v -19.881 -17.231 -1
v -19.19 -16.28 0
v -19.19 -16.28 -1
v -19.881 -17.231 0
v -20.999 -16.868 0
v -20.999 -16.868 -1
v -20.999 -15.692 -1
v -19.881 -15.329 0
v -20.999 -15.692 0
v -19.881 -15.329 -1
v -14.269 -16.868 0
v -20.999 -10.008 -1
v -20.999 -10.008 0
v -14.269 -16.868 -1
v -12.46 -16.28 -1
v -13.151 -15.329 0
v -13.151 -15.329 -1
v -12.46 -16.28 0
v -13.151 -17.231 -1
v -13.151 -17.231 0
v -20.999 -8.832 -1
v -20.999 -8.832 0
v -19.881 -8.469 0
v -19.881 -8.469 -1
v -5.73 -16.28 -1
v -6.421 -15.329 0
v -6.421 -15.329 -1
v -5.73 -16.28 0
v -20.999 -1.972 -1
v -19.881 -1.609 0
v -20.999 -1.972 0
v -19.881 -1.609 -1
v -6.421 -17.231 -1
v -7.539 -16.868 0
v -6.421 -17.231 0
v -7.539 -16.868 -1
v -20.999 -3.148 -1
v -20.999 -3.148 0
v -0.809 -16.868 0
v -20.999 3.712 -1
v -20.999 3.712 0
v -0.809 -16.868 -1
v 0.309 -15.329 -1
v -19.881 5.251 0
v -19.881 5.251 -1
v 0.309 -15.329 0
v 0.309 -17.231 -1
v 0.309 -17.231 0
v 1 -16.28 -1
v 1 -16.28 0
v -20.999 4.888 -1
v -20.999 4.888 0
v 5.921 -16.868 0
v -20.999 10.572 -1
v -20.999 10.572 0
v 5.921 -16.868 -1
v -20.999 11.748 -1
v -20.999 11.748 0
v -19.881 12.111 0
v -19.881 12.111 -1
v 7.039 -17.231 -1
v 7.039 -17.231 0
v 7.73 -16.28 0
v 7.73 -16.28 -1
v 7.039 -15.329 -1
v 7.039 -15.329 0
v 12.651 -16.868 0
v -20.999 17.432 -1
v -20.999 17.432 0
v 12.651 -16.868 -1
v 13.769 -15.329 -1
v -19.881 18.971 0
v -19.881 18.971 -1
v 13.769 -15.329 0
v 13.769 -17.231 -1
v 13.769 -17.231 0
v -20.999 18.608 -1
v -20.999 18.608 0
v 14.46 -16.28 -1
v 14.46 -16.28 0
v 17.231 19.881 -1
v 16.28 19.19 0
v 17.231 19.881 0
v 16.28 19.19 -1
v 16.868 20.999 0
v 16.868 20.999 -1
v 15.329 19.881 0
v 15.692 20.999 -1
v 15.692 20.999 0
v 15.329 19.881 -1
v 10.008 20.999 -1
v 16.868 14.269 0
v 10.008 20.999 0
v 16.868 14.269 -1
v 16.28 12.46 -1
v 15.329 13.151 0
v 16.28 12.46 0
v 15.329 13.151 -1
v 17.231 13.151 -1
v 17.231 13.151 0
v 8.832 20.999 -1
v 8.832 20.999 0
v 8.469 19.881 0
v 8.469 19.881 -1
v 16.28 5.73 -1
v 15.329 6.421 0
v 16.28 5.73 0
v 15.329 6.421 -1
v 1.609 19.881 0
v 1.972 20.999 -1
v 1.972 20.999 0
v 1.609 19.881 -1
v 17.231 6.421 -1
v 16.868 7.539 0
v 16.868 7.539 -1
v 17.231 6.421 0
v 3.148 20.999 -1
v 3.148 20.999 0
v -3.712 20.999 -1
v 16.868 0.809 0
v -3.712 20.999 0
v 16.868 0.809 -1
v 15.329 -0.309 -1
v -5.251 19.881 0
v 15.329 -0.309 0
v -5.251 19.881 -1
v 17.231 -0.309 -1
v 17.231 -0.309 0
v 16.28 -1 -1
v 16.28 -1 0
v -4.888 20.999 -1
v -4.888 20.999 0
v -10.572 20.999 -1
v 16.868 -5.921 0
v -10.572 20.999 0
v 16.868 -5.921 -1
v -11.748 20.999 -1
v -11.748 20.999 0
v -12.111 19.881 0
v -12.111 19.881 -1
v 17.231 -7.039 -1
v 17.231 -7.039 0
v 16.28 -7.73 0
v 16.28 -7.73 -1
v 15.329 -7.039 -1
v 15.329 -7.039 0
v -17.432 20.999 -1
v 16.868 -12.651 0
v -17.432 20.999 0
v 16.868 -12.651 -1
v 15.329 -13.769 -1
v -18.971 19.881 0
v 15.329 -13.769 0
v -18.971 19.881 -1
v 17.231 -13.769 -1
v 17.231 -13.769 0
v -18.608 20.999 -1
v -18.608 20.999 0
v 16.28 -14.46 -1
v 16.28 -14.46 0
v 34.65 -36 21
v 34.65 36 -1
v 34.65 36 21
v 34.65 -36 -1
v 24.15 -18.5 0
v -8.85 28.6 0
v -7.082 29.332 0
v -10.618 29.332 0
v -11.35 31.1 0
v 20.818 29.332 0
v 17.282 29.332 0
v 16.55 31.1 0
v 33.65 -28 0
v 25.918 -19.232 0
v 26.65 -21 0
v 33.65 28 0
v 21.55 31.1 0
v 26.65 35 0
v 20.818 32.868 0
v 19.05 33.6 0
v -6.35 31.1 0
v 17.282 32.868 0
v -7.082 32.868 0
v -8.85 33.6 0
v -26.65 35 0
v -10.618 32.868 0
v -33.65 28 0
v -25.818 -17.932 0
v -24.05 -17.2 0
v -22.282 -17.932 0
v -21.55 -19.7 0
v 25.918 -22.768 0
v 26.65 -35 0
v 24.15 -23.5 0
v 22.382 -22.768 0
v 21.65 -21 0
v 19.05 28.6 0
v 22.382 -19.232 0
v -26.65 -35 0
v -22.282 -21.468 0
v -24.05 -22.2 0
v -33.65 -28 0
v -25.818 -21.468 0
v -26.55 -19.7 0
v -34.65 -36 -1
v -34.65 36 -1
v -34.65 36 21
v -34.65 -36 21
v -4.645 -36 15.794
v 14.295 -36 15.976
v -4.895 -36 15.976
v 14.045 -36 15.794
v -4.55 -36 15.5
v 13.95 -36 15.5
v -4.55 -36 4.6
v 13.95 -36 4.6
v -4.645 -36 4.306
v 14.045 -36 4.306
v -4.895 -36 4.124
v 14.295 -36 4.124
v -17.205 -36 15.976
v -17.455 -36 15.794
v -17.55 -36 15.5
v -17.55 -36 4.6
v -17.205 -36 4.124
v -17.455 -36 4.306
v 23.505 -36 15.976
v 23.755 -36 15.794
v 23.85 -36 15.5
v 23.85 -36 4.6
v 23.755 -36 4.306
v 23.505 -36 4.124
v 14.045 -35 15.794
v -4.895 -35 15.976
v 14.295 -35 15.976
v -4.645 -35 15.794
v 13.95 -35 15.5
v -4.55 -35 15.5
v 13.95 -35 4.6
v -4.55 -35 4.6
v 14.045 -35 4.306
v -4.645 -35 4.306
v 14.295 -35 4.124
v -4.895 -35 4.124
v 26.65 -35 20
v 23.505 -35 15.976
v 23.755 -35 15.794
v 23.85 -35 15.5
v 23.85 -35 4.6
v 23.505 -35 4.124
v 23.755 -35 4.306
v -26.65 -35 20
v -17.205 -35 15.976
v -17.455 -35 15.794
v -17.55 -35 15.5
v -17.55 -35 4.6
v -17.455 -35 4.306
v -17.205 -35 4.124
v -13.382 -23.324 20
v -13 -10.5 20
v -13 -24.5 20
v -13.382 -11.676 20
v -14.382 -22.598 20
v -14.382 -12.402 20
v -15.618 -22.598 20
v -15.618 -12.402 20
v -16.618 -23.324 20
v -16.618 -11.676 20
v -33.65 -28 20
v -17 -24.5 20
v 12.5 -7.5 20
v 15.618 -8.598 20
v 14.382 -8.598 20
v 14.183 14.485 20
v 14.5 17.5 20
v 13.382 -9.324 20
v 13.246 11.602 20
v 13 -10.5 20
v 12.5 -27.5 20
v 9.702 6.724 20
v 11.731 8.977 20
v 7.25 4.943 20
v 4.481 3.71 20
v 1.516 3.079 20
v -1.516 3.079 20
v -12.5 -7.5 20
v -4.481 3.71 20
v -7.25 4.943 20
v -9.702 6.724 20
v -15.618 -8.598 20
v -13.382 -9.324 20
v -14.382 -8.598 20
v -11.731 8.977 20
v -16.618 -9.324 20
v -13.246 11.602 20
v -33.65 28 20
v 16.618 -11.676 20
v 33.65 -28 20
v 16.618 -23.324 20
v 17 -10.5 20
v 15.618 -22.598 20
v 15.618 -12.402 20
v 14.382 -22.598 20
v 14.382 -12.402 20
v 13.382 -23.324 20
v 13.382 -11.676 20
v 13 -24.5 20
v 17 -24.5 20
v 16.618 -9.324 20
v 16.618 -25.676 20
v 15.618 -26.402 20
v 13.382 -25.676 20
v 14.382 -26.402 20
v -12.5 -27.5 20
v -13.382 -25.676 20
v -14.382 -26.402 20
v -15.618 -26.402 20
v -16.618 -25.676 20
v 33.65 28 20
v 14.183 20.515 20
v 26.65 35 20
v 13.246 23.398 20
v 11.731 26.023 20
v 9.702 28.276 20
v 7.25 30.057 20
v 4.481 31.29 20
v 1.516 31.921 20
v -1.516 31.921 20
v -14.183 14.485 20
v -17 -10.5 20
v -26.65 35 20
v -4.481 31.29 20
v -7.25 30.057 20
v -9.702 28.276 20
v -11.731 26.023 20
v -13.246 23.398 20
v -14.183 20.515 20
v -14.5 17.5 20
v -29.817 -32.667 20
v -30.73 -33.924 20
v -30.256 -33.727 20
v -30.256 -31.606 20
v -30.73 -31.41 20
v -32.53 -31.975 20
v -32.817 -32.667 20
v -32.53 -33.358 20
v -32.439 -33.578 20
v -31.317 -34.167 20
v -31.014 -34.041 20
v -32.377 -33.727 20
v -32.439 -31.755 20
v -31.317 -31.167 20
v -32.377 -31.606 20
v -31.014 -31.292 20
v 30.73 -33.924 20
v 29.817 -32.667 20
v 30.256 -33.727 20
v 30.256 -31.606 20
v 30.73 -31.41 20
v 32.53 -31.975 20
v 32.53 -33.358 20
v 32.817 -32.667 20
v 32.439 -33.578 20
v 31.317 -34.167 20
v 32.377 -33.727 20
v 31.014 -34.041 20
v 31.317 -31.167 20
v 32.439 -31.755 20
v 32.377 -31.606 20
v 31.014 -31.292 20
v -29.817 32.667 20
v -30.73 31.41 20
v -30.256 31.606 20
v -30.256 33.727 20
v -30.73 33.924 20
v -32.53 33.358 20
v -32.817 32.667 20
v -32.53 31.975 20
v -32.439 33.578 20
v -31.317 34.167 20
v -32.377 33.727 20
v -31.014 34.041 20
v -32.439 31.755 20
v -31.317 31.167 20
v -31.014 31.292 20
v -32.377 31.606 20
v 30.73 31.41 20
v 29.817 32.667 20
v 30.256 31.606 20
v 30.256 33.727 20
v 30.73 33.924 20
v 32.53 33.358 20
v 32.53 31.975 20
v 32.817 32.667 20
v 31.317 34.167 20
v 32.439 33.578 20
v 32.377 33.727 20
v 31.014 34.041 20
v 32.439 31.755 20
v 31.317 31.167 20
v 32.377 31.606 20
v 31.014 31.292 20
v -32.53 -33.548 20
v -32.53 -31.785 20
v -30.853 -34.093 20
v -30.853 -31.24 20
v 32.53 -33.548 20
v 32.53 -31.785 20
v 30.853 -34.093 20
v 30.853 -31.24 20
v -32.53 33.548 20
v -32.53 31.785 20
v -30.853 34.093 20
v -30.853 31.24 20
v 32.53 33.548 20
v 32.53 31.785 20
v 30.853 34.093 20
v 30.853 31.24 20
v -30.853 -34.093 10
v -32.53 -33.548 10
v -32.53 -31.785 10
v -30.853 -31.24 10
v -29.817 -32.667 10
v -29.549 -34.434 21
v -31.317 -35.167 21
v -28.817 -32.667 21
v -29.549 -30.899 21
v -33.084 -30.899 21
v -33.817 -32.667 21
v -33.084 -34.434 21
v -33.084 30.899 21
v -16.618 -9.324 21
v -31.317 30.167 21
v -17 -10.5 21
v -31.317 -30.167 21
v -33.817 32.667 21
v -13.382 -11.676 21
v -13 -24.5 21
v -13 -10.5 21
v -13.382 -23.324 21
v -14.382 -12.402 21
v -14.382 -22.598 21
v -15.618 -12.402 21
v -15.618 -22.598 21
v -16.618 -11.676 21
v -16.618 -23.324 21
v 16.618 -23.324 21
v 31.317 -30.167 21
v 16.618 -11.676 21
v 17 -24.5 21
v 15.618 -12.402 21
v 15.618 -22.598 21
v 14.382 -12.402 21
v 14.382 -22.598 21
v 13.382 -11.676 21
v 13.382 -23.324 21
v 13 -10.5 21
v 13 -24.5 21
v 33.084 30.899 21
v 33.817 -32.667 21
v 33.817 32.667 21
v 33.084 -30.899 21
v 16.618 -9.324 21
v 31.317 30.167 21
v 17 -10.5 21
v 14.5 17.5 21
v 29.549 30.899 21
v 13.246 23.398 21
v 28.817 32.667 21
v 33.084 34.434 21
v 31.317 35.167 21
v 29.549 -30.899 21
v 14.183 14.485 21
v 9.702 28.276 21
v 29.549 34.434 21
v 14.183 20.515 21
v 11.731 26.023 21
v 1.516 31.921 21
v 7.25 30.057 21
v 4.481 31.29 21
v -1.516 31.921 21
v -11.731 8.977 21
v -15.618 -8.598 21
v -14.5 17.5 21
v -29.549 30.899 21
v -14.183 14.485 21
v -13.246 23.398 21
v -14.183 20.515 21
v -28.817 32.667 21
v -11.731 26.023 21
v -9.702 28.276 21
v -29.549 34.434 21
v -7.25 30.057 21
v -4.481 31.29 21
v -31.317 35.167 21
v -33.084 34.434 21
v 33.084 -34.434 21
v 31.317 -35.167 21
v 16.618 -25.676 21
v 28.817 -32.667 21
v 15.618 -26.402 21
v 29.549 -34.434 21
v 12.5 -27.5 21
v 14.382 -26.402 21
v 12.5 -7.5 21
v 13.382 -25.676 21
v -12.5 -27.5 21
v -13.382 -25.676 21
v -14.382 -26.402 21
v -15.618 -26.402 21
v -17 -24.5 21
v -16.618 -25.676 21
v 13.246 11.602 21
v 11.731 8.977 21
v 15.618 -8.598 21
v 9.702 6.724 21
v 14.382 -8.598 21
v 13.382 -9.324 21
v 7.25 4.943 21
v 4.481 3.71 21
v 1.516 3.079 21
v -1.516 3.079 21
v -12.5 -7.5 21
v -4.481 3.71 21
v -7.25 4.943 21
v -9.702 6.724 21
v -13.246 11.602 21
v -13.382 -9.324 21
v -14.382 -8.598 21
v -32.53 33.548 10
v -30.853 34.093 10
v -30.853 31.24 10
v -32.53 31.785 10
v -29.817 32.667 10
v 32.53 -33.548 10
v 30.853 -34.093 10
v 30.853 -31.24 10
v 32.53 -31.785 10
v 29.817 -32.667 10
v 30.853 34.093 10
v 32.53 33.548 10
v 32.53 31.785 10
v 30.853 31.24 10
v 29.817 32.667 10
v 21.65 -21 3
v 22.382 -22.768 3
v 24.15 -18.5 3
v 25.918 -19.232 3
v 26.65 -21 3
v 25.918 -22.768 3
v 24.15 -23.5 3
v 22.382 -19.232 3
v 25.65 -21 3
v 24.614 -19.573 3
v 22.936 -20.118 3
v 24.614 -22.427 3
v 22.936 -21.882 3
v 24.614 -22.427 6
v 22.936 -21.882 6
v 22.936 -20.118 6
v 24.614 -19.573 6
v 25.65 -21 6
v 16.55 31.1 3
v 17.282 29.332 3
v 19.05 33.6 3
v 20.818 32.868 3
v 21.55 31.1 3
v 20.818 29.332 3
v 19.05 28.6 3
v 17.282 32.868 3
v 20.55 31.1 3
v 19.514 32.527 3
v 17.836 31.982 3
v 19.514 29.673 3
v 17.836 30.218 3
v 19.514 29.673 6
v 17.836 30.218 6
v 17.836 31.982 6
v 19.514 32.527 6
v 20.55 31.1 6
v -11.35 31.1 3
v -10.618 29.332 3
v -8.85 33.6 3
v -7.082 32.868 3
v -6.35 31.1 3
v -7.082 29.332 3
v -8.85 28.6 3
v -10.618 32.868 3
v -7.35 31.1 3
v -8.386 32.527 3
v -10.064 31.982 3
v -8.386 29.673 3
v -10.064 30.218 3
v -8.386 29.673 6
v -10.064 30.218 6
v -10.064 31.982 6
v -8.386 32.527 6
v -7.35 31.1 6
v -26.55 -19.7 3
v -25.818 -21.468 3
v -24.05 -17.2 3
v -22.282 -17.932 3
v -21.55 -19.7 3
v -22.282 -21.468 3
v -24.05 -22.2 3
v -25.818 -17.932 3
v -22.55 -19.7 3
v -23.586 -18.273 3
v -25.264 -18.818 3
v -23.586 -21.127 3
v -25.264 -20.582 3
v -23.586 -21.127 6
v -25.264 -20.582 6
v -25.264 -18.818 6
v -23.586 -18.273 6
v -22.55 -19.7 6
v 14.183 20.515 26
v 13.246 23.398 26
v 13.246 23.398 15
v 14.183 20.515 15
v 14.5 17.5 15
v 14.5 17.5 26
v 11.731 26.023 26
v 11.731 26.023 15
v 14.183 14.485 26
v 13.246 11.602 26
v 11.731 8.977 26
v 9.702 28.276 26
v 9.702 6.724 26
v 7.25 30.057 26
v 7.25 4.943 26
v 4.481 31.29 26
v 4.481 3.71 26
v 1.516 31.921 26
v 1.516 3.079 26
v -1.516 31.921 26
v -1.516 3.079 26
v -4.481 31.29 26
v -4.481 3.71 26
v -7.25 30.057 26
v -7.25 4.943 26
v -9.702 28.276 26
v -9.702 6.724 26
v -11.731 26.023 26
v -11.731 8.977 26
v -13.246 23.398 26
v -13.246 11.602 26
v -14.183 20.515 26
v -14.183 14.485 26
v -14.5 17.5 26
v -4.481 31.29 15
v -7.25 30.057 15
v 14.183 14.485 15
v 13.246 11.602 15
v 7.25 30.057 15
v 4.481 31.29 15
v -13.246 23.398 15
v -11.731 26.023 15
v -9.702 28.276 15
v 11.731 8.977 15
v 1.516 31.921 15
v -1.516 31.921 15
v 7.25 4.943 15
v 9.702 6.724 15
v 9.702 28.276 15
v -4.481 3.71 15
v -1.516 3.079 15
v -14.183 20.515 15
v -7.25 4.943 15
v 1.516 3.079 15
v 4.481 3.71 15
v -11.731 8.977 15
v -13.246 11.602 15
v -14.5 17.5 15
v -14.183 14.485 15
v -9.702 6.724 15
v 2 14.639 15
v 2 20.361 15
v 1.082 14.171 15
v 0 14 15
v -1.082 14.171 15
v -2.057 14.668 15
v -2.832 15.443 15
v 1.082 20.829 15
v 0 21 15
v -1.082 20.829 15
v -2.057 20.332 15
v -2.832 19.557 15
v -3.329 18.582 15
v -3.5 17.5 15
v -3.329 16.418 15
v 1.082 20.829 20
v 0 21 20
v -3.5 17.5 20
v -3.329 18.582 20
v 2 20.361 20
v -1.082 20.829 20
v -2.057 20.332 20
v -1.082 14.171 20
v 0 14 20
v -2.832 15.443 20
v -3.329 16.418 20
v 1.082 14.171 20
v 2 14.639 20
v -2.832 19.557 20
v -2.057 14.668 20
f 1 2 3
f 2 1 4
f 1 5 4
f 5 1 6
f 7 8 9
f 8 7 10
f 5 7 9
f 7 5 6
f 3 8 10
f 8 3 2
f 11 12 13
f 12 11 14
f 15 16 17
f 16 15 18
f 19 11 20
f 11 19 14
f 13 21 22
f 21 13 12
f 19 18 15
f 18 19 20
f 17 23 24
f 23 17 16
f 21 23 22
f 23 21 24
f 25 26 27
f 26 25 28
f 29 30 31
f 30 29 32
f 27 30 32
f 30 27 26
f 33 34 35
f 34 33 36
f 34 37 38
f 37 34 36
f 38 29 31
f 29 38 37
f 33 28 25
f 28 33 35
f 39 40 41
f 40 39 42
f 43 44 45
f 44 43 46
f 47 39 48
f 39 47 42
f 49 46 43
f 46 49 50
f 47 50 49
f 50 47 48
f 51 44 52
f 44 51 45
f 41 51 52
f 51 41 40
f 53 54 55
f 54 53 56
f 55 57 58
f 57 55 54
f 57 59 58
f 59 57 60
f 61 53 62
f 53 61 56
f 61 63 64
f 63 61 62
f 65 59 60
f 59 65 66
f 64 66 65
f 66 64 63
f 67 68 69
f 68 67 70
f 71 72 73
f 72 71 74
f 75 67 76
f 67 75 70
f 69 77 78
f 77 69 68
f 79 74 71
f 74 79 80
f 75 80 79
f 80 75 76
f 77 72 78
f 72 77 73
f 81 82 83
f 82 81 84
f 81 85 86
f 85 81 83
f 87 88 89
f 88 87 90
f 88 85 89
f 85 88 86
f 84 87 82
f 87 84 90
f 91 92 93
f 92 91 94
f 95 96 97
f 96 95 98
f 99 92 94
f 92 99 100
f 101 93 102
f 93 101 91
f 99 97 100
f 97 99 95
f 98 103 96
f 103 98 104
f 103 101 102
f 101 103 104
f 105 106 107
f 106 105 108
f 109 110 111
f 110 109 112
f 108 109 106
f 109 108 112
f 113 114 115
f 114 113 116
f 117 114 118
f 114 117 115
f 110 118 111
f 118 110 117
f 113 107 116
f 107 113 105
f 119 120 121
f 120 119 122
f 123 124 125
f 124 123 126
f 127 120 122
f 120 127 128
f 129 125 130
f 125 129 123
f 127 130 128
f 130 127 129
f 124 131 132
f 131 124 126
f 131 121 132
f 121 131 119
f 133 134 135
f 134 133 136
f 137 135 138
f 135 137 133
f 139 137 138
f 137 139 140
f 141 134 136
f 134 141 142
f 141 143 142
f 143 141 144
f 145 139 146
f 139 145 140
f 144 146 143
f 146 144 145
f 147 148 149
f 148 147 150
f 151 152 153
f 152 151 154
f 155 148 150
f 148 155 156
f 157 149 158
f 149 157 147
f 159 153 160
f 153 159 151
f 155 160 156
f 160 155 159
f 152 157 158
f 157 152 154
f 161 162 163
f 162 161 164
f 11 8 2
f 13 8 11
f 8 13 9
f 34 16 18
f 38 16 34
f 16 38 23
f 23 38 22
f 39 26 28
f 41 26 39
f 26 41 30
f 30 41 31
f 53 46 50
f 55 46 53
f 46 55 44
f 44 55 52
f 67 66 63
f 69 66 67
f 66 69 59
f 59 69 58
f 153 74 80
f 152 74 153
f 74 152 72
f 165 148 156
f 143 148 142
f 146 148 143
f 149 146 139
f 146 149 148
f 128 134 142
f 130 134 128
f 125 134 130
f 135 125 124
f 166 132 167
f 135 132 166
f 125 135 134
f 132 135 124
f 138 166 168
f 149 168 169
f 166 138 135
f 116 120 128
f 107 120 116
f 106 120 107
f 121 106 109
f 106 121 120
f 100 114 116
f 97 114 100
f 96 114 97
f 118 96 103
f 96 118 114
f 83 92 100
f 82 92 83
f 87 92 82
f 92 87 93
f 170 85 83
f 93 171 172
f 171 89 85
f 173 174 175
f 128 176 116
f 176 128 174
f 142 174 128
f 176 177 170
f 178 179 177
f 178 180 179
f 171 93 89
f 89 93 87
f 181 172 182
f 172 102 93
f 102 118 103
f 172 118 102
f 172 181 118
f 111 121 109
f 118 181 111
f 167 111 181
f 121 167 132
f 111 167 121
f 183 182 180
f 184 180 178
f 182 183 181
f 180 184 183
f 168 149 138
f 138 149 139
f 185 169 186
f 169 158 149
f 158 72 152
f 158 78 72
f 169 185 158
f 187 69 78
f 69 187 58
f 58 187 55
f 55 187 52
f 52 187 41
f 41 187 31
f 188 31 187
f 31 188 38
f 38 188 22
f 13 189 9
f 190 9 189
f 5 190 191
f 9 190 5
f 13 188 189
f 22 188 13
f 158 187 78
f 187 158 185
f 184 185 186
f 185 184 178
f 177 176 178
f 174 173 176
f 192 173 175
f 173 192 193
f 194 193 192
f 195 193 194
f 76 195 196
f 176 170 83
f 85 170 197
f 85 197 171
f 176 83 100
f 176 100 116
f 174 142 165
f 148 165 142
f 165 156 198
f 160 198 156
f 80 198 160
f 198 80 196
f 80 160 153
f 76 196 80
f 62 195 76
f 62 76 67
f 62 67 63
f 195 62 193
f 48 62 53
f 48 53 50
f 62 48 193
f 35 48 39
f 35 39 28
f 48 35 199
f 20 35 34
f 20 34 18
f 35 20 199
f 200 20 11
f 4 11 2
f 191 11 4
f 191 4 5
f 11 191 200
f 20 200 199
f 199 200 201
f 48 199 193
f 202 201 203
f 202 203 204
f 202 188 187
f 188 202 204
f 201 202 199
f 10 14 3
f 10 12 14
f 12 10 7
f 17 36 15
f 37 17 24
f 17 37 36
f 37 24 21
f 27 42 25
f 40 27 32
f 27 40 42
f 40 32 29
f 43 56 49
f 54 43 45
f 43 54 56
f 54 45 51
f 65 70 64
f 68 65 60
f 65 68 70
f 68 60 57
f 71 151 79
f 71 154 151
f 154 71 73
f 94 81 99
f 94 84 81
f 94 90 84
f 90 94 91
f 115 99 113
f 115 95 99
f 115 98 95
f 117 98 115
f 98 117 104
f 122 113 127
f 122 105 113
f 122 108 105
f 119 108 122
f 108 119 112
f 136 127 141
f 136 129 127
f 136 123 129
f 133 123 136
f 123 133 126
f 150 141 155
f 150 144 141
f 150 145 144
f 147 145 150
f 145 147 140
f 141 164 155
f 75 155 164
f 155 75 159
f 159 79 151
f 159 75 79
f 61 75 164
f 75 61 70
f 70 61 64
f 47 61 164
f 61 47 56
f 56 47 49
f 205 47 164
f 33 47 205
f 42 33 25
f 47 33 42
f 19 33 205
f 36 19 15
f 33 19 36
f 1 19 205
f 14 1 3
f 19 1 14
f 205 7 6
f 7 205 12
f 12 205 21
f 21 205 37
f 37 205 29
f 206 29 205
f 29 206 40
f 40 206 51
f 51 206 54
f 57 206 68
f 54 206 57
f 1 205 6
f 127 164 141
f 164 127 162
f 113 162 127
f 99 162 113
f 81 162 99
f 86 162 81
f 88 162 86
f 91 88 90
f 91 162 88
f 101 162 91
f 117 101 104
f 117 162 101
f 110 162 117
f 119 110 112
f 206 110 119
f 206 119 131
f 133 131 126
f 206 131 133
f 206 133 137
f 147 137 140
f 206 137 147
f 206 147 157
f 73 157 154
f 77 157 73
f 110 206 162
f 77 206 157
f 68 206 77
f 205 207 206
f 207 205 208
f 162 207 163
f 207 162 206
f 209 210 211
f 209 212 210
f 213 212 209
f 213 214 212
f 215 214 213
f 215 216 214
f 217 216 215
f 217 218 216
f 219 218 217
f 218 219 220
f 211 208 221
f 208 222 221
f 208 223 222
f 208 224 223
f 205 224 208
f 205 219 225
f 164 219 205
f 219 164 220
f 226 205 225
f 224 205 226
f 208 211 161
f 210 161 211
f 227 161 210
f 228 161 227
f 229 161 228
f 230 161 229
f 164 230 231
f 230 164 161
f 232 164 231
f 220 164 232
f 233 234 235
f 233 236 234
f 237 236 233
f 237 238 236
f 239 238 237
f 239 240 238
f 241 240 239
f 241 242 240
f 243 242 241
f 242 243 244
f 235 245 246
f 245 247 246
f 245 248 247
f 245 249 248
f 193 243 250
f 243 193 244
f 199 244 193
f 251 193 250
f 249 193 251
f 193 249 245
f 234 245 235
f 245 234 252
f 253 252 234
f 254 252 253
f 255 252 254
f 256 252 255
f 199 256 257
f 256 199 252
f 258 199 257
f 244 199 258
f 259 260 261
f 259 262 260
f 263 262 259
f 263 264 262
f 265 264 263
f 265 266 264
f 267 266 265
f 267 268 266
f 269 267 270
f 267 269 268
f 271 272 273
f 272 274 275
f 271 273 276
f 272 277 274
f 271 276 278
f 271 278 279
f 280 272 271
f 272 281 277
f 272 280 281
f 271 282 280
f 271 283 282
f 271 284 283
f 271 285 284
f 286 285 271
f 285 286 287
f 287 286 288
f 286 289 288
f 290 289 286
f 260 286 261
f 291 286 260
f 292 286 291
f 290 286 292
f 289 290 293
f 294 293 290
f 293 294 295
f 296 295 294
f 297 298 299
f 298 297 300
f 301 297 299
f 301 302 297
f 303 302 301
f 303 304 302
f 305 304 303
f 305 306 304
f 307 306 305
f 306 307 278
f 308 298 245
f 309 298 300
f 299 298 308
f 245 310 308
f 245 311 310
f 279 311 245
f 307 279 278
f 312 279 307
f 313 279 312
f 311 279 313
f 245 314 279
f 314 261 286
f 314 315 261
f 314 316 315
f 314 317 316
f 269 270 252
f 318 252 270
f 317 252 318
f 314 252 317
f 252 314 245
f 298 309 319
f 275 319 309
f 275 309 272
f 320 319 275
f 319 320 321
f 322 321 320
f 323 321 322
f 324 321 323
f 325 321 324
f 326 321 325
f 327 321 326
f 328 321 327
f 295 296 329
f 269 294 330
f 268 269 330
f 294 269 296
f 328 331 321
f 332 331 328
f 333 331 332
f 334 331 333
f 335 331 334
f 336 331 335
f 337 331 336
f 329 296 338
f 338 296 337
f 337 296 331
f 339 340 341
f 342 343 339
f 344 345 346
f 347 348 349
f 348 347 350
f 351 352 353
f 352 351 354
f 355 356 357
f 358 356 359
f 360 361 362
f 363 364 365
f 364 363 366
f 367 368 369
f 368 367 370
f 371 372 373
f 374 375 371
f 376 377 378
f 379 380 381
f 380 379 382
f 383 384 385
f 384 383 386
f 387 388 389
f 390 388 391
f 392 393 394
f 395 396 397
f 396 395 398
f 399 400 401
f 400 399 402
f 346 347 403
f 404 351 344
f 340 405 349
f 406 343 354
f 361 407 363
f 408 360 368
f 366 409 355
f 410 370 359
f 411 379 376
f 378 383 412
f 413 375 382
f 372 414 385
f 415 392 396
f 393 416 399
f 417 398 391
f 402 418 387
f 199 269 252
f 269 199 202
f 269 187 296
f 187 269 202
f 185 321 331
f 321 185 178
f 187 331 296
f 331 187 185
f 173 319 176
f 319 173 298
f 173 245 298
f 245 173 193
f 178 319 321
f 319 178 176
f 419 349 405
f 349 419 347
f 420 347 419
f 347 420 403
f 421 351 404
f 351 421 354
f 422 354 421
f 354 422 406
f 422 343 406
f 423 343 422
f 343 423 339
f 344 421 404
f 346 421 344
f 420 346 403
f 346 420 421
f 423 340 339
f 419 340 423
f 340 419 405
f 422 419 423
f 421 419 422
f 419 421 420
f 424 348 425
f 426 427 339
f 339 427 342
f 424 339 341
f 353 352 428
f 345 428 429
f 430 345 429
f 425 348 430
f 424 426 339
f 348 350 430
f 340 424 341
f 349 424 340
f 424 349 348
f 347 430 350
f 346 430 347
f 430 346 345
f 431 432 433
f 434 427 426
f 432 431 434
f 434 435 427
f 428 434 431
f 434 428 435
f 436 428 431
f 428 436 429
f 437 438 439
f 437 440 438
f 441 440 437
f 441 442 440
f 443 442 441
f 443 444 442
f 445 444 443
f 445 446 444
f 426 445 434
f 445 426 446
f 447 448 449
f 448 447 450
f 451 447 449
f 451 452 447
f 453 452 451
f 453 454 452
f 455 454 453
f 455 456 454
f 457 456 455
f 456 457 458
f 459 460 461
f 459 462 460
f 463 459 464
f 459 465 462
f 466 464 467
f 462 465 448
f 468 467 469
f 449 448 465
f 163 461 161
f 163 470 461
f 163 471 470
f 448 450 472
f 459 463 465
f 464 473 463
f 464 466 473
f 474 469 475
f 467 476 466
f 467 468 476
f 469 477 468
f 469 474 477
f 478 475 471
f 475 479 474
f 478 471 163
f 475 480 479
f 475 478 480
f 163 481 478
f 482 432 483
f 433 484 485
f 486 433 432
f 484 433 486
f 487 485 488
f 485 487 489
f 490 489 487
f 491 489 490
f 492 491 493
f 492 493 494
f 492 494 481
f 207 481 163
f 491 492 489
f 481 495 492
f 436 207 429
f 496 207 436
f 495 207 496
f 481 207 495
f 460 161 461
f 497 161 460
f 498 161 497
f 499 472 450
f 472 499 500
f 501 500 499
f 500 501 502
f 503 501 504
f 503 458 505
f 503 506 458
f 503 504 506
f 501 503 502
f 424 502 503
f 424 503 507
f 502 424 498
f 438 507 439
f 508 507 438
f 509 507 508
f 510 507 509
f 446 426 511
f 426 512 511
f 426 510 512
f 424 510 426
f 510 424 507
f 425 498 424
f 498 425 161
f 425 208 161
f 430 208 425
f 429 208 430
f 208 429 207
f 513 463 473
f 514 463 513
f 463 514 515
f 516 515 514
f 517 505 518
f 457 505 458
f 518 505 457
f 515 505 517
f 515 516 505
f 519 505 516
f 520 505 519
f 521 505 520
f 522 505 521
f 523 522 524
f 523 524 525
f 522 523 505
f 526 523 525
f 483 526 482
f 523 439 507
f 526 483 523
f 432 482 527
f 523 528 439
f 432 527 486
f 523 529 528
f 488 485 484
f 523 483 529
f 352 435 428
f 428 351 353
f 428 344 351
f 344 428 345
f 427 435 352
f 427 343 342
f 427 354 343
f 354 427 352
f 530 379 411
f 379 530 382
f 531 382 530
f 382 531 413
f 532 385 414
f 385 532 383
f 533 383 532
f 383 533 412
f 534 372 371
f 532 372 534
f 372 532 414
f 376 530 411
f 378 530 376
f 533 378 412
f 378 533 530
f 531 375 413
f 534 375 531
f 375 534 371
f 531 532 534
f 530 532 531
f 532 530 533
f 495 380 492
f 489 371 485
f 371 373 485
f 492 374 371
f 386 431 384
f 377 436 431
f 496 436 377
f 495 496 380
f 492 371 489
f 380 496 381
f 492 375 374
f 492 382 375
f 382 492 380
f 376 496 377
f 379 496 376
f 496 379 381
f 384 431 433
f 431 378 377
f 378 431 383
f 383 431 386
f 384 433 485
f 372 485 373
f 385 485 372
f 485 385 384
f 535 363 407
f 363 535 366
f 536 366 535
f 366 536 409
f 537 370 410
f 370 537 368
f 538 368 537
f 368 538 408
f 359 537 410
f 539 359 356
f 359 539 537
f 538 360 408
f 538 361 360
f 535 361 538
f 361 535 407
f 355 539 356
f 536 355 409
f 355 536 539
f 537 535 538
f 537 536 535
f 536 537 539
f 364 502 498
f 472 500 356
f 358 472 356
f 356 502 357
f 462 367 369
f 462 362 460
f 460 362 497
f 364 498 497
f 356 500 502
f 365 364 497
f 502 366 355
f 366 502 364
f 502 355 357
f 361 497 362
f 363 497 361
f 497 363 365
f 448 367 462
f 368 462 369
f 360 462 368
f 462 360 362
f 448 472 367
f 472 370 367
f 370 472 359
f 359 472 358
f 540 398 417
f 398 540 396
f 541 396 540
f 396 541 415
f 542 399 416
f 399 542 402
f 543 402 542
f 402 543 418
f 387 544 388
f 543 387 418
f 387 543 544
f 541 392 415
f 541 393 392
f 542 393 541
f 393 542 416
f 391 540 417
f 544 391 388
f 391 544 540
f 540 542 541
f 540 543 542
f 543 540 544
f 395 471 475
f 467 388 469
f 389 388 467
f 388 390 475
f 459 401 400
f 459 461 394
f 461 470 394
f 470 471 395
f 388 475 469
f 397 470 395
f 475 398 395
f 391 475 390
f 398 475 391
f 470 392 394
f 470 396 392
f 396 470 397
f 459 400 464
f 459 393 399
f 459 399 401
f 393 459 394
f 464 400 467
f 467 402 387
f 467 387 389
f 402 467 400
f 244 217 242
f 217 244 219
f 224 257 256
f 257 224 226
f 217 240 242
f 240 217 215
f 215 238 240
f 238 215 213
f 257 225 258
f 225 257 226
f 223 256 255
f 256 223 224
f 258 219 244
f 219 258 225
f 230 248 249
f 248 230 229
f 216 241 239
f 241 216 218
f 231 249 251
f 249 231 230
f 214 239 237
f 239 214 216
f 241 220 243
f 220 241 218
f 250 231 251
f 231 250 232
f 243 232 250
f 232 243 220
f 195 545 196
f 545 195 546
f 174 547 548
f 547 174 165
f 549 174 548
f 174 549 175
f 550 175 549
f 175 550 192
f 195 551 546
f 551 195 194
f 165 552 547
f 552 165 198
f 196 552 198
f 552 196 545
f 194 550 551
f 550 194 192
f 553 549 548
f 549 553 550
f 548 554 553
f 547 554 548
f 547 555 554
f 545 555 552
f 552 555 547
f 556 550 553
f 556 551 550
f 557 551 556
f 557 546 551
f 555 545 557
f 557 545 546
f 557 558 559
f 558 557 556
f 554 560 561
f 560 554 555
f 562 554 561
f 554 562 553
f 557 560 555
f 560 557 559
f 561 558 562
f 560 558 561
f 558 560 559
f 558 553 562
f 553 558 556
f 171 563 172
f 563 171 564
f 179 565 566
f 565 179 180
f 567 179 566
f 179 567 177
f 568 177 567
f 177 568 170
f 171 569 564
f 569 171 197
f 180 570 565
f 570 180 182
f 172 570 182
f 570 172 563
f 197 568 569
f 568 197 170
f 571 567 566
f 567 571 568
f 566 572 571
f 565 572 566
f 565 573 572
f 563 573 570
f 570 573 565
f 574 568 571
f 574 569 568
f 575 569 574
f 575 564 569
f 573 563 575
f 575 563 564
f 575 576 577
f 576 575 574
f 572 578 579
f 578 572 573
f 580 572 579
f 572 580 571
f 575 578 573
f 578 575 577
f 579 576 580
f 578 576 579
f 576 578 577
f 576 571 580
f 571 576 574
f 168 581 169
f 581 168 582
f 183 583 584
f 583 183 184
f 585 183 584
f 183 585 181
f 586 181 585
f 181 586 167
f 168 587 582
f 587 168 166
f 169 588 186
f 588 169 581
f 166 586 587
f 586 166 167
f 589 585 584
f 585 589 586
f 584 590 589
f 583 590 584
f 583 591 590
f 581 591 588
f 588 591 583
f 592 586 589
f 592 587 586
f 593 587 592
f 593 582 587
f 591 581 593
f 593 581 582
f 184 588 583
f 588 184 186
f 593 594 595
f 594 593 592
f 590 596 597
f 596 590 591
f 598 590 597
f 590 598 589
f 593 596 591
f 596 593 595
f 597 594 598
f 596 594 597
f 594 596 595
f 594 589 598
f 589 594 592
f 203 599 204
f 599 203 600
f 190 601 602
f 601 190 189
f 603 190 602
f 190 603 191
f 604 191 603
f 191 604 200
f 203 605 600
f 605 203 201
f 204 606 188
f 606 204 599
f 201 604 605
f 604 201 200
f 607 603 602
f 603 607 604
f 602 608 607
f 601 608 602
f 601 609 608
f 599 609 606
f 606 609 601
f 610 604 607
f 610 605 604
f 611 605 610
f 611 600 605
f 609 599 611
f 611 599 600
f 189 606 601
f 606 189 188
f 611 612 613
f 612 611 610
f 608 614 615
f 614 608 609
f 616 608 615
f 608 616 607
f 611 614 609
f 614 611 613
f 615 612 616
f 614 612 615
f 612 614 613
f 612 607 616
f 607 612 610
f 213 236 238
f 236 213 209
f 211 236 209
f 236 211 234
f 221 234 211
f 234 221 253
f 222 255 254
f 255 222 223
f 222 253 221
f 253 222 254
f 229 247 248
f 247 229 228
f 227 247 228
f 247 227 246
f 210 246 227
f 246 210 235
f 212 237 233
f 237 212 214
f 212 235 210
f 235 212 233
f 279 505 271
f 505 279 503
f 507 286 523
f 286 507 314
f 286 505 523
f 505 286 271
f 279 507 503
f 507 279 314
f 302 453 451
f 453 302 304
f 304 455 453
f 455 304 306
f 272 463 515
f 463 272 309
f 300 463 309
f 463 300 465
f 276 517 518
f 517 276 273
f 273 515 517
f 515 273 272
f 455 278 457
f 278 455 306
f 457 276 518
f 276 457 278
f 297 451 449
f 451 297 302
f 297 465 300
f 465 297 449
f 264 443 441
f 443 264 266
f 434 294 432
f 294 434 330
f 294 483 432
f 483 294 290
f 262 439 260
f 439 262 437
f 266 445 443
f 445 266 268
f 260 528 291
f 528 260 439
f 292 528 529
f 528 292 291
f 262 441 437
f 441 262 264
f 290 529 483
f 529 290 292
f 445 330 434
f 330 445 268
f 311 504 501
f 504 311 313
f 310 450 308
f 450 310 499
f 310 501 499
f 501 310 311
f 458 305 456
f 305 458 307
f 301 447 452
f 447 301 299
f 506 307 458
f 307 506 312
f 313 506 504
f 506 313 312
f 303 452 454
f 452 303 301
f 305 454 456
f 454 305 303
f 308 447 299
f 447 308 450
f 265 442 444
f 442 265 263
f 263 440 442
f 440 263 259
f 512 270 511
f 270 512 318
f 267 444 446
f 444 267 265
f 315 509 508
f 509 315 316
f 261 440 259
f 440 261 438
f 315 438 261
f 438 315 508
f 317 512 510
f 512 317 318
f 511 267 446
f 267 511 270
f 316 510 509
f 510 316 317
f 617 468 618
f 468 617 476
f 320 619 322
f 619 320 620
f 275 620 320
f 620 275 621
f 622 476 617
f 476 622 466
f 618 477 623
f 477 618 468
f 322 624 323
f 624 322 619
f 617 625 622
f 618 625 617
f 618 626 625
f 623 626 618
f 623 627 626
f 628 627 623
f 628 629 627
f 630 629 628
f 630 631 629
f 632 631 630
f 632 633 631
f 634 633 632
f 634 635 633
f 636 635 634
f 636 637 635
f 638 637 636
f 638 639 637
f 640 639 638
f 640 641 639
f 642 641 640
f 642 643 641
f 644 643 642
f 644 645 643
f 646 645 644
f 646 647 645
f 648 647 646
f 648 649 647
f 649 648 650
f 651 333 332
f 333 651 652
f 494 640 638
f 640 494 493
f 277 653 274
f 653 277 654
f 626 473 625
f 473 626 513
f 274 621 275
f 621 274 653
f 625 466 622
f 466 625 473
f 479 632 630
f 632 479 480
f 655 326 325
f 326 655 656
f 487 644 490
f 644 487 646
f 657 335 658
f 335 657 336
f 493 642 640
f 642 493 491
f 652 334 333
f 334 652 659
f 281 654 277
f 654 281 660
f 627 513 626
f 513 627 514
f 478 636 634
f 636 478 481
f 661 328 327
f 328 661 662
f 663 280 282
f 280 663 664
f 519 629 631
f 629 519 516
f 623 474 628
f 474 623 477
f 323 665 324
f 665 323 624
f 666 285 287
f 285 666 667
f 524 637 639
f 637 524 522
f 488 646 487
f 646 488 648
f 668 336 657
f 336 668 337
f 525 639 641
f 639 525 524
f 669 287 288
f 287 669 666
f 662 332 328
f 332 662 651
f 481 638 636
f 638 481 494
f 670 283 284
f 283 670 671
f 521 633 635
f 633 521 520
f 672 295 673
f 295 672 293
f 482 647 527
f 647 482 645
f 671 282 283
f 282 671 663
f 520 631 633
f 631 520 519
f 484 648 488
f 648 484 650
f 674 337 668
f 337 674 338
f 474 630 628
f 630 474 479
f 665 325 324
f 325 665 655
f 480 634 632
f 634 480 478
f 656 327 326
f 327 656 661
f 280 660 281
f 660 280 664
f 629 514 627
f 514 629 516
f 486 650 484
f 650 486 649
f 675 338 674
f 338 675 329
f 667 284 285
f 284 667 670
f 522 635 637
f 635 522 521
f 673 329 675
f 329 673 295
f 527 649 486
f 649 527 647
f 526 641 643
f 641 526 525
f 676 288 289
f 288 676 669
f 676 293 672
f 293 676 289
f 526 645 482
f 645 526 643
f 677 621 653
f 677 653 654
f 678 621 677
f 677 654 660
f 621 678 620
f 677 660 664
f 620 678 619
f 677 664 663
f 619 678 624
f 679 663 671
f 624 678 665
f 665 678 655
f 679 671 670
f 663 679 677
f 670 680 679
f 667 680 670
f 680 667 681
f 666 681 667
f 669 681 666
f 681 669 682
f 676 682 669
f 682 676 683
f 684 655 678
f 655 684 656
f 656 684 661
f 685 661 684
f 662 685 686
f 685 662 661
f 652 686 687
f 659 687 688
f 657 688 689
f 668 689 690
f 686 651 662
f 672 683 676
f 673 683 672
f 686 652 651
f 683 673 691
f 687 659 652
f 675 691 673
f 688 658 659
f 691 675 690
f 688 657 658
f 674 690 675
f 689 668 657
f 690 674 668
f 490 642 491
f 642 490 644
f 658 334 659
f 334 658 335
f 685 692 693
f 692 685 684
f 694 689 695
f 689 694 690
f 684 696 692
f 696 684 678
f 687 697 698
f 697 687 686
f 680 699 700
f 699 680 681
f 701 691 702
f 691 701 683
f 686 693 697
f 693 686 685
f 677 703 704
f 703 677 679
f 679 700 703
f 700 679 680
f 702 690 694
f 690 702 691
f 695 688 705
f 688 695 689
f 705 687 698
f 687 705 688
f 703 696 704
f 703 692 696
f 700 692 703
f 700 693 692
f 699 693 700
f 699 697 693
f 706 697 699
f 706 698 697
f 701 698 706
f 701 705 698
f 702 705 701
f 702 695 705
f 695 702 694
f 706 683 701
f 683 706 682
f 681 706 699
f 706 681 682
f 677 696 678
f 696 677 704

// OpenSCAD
PARTNO = undef;

a_l = 68.6;
a_w = 53.3;
a_h = 20;
pad=3;
usb=[[9.6, 1.6], [12, 10.9]];
charge=[[a_w - 3.3 - 8.9, 1.6], [8.9, 10.9]];
side=7;
w = a_w + side * 2;
l = 70;
t = 1;
d = 0.5;
edge = [-w / 2, -l / 2, 0];
module cover(h) {
	translate(edge + [-t, -t, h]) cube([w + t * 2, l + t * 2, t]);
}

module wall() {
	difference() {
		translate(edge - [t, t, 0]) cube([w + 2*t, l + 2*t, a_h]);
		translate(edge) cube([w, l, a_h]);
	}
}

module screws() {
	l = a_h / 2;
	module screw() {
		translate(edge + [side / 3, side / 3, a_h - l]) {
			cylinder(l, r=1.5);
			translate([0, 0, l]) cylinder(t, r1=1.5, r2=2.5);
		}
	}
	screw();
	mirror([0, 1, 0]) screw();
	mirror([1, 0, 0]) screw();
	mirror([1, 0, 0]) mirror([0, 1, 0]) screw();
}

module supports() {
	module support() {
		translate(edge) {
			linear_extrude(height=a_h) polygon([[0, 0], [side, 0], [0, side]]);
		}
	}
	support();
	mirror([0, 1, 0]) support();
	mirror([1, 0, 0]) support();
	mirror([1, 0, 0]) mirror([0, 1, 0]) support();
}

module cut(size) {
	rotate([90, 0, 0]) minkowski() {
		cylinder(1, $fn=10, r=d, center=true);
		cube([size[0], size[1], 10]);	
	}
}

module ports(extra_height = 0) {
	translate([-a_w / 2, -l / 2, pad]) {
		translate([usb[0][0],5 ,usb[0][1]]) cut([usb[1][0], usb[1][1] + extra_height]);
		translate([charge[0][0],5 ,charge[0][1]]) cut([charge[1][0], charge[1][1] + extra_height]);
	}
}
module base() {
	module hulls() {
		for(i = [0.2:0.1:0.7]) {
			hull() {
				translate(edge + [0, 5, 0]) {
					translate([w * i, a_l * 0.2, 0]) cylinder(5, r=1, center = true);
					translate([w * 0.2, a_l * i, 0]) cylinder(5, r=1, center = true);

				}
			}
		}
	}
	difference() {
		cover(-1);
		hulls();
		mirror([1, 1, 0]) hulls();
	}
	difference() {
		supports();
		screws();
	}
	difference() {
		wall();
		ports(a_h);
	}

	hx = [2.5, 5.1, 27.9, 15.2];
	hy = [14, 1.3, 50.8, 0];
	translate([-a_w / 2, -l / 2, 0]) {
		pad([a_w - hx[0], hy[0], 0]);
		pad([a_w - hx[0] - hx[1], hy[0] + hy[1] + hy[2], 0]);
		pad([a_w - hx[0] - hx[1] - hx[2], hy[0] + hy[1] + hy[2], 0]);
		pad([a_w - hx[0] - hx[1] - hx[2] - hx[3], hy[0] + hy[1], 0]);
	}	
	module pad(pos) {
		translate(pos) {
			cylinder(pad, r=2.5);
			cylinder(r=1.5, h=pad + 3);
		}
	}
}

module screen_port() {
	module drill() translate([15, 7, 0]) cylinder(5, r=2, $fn=10, center = true);
	translate([0, -l / 4, a_h]) {
		cube([25, 20, 5], center = true);
		drill();
		mirror([1, 0, 0]) drill();
		mirror([0, 1, 0]) drill();
		mirror([1, 0, 0]) mirror([0, 1, 0]) drill();
	}
}

module top() {
	difference() {
		union() {
			cover(a_h);
			wall();
		}
		base();
		ports();
		screen_port();
		hull() dial();
		screws();
	}
	
}

module dial() {
	d_h = 10;
	translate([0, l / 4, a_h - d_h / 2]) {
		difference() {
			cylinder(d_h + t, r=l / 5 + d(3));
			cylinder(d_h / 2, $fn=20, r = 3 + d);	
		}
		translate([1.5 + d, -3, 0]) cube([6, 6, d_h]);
	}
}

function d(part) = part == PARTNO ? 0 : d;
if (PARTNO == 1)
	base();
if (PARTNO == 2)
	top();
if (PARTNO == 3)
	dial();
if (PARTNO == undef) {
	base();
	top();
	dial();
}
